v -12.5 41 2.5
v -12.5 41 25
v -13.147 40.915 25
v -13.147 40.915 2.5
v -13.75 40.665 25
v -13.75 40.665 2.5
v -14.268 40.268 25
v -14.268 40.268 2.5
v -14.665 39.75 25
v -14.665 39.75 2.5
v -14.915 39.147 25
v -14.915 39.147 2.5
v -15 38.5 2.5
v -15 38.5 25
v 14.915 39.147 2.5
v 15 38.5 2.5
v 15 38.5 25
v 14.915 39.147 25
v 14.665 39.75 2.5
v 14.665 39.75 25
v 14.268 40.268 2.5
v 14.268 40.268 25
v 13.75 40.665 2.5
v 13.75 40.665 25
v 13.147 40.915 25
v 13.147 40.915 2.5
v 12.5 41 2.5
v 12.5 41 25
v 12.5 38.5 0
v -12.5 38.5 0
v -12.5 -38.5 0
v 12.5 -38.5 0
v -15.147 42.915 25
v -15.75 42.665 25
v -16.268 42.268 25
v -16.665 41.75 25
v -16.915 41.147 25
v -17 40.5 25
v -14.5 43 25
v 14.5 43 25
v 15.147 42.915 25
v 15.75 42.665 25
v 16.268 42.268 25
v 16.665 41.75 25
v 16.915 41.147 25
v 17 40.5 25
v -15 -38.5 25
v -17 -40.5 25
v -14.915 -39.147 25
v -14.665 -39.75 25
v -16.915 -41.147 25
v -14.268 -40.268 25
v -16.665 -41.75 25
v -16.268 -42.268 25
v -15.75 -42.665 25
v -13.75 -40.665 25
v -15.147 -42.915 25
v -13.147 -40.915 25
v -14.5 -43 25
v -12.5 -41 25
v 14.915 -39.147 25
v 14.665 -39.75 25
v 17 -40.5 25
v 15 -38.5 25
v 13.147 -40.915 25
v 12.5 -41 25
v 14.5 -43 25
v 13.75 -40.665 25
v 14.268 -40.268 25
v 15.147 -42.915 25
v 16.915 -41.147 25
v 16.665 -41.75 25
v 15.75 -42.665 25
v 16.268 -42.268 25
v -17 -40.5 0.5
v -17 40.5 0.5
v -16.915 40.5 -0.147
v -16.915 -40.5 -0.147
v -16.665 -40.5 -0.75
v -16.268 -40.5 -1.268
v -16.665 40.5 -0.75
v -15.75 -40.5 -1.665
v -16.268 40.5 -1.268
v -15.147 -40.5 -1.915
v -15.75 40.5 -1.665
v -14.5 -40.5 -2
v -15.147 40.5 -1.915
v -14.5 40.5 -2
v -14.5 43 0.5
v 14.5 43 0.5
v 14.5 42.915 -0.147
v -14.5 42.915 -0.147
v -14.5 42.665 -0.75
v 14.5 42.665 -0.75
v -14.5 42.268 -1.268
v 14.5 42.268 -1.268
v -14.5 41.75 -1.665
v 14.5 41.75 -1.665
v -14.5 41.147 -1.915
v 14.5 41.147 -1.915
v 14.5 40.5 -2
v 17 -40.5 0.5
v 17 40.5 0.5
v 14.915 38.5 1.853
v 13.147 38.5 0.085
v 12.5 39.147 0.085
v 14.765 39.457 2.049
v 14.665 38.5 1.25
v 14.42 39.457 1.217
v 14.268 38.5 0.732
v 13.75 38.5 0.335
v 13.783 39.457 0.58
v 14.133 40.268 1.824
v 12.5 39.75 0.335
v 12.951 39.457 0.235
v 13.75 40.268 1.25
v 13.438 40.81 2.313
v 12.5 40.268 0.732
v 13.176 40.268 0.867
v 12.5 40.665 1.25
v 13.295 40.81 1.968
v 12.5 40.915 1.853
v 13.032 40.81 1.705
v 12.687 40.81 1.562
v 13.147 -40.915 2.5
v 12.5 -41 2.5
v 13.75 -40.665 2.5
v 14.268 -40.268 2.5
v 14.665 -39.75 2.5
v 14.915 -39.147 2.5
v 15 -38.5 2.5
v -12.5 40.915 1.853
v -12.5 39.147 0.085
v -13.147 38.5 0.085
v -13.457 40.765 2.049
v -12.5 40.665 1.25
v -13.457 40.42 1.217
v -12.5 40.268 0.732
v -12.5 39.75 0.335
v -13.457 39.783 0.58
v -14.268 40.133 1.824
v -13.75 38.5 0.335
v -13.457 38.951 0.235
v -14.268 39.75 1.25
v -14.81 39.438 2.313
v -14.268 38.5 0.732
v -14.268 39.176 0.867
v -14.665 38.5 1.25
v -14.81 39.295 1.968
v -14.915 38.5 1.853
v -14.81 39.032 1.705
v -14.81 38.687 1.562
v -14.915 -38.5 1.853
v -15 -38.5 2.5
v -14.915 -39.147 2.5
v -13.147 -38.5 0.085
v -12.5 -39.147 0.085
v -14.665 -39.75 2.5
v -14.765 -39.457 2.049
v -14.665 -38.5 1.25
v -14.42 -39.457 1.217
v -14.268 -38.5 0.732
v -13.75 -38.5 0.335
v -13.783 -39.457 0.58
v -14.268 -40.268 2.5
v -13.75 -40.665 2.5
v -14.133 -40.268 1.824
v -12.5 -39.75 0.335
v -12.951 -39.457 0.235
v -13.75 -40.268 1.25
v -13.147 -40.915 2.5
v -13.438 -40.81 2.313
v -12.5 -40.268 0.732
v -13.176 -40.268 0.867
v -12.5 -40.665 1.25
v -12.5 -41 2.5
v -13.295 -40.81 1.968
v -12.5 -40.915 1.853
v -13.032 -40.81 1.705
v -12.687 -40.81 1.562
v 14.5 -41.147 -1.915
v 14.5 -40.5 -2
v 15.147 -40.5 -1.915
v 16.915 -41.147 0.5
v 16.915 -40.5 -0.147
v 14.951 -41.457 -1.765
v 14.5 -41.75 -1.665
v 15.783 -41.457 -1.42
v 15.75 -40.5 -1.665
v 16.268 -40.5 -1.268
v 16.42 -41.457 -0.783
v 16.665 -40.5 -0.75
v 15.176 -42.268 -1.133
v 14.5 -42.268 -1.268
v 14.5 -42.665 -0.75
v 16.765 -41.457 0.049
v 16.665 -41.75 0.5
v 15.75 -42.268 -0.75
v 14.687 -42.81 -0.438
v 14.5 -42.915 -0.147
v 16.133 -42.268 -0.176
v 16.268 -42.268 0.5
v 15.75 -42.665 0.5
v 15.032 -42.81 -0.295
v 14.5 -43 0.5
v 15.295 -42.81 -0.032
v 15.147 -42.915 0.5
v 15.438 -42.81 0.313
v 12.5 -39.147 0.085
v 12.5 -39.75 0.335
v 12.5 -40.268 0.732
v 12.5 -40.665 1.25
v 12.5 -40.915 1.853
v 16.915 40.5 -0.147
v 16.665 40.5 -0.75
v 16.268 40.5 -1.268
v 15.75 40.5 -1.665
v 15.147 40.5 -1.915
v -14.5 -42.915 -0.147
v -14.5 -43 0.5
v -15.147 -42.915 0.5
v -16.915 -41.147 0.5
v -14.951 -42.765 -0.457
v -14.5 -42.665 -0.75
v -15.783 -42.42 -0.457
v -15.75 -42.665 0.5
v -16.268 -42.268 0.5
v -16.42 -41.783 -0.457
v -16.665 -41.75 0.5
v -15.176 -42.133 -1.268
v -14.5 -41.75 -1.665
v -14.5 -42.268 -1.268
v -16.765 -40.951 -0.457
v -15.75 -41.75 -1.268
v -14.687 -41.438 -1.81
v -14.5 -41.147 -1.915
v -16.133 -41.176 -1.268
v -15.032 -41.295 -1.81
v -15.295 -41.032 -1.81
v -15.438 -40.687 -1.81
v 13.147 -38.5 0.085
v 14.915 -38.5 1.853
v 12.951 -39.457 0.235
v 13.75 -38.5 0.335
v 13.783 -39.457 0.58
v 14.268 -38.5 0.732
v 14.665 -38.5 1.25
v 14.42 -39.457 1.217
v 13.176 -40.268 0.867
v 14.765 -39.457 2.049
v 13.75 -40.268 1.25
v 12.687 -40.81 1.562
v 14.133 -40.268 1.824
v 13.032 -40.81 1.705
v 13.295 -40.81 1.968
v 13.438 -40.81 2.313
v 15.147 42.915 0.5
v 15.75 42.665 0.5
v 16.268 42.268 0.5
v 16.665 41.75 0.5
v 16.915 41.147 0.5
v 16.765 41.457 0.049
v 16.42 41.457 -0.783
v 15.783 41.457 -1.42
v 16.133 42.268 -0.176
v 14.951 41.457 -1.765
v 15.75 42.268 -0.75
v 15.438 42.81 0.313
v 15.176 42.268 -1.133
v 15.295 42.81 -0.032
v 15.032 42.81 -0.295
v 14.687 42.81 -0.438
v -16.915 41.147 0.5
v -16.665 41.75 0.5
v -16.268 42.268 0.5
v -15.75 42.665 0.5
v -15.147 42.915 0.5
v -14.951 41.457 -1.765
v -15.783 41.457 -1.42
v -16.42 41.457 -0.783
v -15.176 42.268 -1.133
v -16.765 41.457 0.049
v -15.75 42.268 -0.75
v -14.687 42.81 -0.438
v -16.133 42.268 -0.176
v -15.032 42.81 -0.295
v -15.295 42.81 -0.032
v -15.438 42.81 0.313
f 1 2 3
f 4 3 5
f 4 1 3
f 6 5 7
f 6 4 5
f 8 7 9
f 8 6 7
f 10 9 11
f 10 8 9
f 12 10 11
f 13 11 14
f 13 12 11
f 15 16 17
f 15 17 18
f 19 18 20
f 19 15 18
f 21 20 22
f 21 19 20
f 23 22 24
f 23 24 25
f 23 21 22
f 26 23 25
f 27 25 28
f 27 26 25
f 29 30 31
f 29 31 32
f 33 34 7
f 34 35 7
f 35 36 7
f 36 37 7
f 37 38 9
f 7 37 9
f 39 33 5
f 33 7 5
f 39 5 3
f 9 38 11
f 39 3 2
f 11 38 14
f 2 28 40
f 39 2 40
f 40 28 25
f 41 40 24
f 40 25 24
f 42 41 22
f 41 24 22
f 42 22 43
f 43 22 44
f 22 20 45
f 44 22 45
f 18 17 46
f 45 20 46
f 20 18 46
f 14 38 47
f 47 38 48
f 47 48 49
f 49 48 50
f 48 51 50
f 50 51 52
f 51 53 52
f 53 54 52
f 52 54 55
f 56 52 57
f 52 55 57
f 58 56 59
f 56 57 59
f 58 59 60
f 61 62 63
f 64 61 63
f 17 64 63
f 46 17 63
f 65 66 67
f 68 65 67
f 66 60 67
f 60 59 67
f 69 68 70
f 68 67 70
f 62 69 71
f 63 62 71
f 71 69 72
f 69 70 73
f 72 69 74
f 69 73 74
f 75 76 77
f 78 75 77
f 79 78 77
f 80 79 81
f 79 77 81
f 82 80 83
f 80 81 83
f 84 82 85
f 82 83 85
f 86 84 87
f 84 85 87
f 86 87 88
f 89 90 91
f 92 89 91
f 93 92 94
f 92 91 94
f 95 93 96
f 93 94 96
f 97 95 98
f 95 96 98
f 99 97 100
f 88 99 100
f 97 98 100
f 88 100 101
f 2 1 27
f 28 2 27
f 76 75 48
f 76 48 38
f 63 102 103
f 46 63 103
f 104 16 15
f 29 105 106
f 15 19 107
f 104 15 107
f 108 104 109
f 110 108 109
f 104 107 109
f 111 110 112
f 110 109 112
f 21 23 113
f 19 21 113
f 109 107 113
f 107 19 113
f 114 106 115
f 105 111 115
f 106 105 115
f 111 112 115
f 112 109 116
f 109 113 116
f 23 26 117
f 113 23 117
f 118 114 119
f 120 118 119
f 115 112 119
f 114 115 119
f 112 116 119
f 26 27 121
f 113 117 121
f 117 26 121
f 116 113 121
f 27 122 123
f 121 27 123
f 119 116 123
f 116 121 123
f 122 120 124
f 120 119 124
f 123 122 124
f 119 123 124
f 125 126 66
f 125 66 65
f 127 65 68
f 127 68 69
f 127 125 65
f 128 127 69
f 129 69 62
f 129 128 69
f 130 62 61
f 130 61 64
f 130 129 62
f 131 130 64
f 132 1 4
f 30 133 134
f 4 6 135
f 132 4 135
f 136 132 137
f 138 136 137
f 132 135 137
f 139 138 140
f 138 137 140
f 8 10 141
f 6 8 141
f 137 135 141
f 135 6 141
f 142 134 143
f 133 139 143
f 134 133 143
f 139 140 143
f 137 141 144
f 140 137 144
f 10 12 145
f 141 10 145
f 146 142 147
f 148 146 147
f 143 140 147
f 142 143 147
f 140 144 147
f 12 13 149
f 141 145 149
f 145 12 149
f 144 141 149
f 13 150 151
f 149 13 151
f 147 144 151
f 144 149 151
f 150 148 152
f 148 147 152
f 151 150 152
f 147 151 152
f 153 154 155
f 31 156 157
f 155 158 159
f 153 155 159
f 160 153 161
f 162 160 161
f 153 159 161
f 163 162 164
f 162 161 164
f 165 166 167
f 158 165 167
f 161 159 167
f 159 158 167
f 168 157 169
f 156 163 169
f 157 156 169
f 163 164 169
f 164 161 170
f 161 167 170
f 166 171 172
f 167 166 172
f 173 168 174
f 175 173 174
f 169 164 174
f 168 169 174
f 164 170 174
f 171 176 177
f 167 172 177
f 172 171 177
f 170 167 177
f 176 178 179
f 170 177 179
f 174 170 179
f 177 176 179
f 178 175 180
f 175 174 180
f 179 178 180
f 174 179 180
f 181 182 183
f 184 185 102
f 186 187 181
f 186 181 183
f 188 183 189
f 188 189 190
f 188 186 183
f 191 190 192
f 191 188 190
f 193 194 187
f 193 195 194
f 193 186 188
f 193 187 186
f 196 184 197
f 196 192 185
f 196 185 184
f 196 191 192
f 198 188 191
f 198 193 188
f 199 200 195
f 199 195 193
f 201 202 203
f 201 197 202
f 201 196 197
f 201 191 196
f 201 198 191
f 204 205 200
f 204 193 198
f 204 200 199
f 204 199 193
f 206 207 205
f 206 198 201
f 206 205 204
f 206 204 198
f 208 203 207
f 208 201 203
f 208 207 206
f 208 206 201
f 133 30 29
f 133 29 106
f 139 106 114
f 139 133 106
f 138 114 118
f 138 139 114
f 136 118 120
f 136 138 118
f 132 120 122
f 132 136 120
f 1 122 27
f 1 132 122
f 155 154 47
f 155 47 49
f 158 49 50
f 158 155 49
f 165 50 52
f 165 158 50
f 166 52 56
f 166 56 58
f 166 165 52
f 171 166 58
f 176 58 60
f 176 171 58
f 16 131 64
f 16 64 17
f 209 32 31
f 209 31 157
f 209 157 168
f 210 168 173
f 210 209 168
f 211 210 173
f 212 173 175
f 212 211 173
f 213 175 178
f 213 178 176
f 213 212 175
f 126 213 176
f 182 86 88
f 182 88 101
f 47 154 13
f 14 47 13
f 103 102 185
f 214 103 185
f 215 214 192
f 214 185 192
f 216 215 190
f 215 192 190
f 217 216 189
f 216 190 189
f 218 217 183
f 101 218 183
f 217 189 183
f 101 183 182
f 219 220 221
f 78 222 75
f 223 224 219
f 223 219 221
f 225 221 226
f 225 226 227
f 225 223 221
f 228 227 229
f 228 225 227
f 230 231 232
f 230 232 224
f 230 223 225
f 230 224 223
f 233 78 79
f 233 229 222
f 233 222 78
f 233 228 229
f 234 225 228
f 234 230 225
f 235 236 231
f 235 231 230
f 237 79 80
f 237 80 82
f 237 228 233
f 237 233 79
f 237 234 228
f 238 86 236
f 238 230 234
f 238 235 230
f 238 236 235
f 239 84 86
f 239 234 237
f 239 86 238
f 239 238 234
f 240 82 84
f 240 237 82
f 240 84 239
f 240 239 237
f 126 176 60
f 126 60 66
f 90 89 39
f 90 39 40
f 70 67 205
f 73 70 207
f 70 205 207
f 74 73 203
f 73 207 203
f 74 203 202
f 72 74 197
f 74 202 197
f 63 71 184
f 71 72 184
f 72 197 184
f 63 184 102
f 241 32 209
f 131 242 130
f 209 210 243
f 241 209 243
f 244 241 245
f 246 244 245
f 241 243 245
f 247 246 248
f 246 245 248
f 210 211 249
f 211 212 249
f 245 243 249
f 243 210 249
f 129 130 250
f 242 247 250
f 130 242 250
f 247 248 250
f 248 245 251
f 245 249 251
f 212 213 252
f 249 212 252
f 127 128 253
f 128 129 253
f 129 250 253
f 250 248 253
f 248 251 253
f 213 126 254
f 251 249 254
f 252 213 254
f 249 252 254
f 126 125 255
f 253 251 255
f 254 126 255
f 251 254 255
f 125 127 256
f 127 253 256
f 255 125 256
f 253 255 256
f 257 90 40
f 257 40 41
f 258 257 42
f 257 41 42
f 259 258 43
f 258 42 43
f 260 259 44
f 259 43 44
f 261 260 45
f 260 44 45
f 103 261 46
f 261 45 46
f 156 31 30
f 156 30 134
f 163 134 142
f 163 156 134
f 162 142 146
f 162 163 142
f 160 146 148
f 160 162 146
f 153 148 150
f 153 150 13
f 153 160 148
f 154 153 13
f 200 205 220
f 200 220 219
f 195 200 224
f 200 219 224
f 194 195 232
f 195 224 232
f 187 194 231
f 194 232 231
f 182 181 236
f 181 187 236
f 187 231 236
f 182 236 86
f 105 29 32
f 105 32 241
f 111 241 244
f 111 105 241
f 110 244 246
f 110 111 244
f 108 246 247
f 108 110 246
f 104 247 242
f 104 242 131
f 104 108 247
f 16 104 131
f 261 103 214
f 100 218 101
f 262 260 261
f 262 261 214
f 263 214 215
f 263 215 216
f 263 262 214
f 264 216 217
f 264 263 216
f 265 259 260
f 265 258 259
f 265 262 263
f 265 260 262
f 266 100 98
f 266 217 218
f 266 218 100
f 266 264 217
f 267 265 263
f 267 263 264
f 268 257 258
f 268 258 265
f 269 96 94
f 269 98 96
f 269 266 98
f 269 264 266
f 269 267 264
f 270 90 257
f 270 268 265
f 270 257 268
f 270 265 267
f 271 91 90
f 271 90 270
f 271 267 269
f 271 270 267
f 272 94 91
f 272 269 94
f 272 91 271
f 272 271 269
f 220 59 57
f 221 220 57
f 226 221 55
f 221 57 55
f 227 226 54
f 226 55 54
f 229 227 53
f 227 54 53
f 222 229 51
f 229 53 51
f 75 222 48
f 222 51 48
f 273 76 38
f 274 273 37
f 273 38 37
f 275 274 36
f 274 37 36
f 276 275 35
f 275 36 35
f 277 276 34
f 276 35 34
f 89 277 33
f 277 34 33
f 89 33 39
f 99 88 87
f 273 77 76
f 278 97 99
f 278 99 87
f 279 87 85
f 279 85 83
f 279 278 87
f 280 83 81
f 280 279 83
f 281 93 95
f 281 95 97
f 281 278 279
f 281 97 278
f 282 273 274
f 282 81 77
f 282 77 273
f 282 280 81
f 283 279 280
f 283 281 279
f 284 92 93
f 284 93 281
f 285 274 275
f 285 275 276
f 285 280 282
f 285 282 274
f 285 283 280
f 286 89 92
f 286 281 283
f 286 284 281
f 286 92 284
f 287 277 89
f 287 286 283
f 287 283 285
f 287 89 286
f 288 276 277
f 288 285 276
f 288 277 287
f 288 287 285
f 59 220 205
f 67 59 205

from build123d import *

# Parameters (mm, degrees)
ESQUISSE1_W        = 30
ESQUISSE1_H        = 82
BOSS_EXTRU_1_DEPTH = 25
COQUE1_T           = 2
CONG_1_R           = 2.5


with BuildPart() as part:
    # Esquisse1 → Boss.-Extru.1 (new body)
    with BuildSketch(Plane.XY):
        Rectangle(ESQUISSE1_W, ESQUISSE1_H)
    extrude(amount=BOSS_EXTRU_1_DEPTH)

    # Coque1
    coque1_openings = [part.faces().sort_by_distance(p)[0] for p in [
        (0, 0, 25),
    ]]
    offset(amount=COQUE1_T, openings=coque1_openings, kind=Kind.INTERSECTION)

    # Congé1
    # the kernel refuses this fillet: 2.5 mm, written as the material it adds along each edge
    with BuildSketch(Plane(origin=(-12.5, -38.5, 2.5), x_dir=(-1, 0, 0), z_dir=(0, -1, 0))) as cong_1_piece_1_section:
        Polygon((0, 0), (CONG_1_R, 0), (CONG_1_R, CONG_1_R), (0, CONG_1_R), align=None)
    cong_1_piece_1 = extrude(amount=CONG_1_R, mode=Mode.PRIVATE)
    cong_1_piece_1 = cong_1_piece_1 - Plane(origin=(-12.5, -38.5, 2.5), x_dir=(0.7071067811865475, 0, 0.7071067811865475), z_dir=(0, -1, 0)) * Sphere(CONG_1_R, mode=Mode.PRIVATE)
    add(cong_1_piece_1)
    with BuildSketch(Plane(origin=(-12.5, 38.5, 2.5), x_dir=(0, 1, 0), z_dir=(-1, 0, 0))) as cong_1_piece_2_section:
        Polygon((0, 0), (CONG_1_R, 0), (CONG_1_R, CONG_1_R), (0, CONG_1_R), align=None)
    cong_1_piece_2 = extrude(amount=CONG_1_R, mode=Mode.PRIVATE)
    cong_1_piece_2 = cong_1_piece_2 - Plane(origin=(-12.5, 38.5, 2.5), x_dir=(0, -0.7071067811865475, 0.7071067811865475), z_dir=(-1, 0, 0)) * Sphere(CONG_1_R, mode=Mode.PRIVATE)
    add(cong_1_piece_2)
    with BuildSketch(Plane(origin=(12.5, -38.5, 2.5), x_dir=(1, 0, 0), z_dir=(0, -1, 0))) as cong_1_piece_3_section:
        Polygon((0, 0), (CONG_1_R, 0), (CONG_1_R, -CONG_1_R), (0, -CONG_1_R), align=None)
    cong_1_piece_3 = extrude(amount=CONG_1_R, mode=Mode.PRIVATE)
    cong_1_piece_3 = cong_1_piece_3 - Plane(origin=(12.5, -38.5, 2.5), x_dir=(-0.7071067811865475, 0, 0.7071067811865475), z_dir=(0, -1, 0)) * Sphere(CONG_1_R, mode=Mode.PRIVATE)
    add(cong_1_piece_3)
    with BuildSketch(Plane(origin=(12.5, 38.5, 2.5), x_dir=(1, 0, 0), z_dir=(0, 1, 0))) as cong_1_piece_4_section:
        Polygon((0, 0), (CONG_1_R, 0), (CONG_1_R, CONG_1_R), (0, CONG_1_R), align=None)
    cong_1_piece_4 = extrude(amount=CONG_1_R, mode=Mode.PRIVATE)
    cong_1_piece_4 = cong_1_piece_4 - Plane(origin=(12.5, 38.5, 2.5), x_dir=(-0.7071067811865475, 0, 0.7071067811865475), z_dir=(0, 1, 0)) * Sphere(CONG_1_R, mode=Mode.PRIVATE)
    add(cong_1_piece_4)
    with BuildSketch(Plane(origin=(-15, -38.5, 0), x_dir=(0, 0, 1), z_dir=(0, 1, 0)), Plane(origin=(15, 38.5, 0), x_dir=(0, 0, 1), z_dir=(0, -1, 0))) as cong_1_piece_5:
        with BuildLine():
            CenterArc((CONG_1_R, CONG_1_R), CONG_1_R, 180, 90)
            Line((0, CONG_1_R), (0, 0))
            Line((0, 0), (CONG_1_R, 0))
        make_face()
    extrude(amount=77)
    with BuildSketch(Plane(origin=(-15, 41, 2.5), x_dir=(0, -1, 0), z_dir=(0, 0, 1)), Plane(origin=(-15, -41, 2.5), x_dir=(1, 0, 0), z_dir=(0, 0, 1)), Plane(origin=(15, 41, 2.5), x_dir=(-1, 0, 0), z_dir=(0, 0, 1))) as cong_1_piece_6:
        with BuildLine():
            CenterArc((CONG_1_R, CONG_1_R), CONG_1_R, 180, 90)
            Line((0, CONG_1_R), (0, 0))
            Line((0, 0), (CONG_1_R, 0))
        make_face()
    extrude(amount=22.5)
    with BuildSketch(Plane(origin=(12.5, -41, 0), x_dir=(0, 0, 1), z_dir=(-1, 0, 0)), Plane(origin=(-12.5, 41, 0), x_dir=(0, 0, 1), z_dir=(1, 0, 0))) as cong_1_piece_7:
        with BuildLine():
            CenterArc((CONG_1_R, CONG_1_R), CONG_1_R, 180, 90)
            Line((0, CONG_1_R), (0, 0))
            Line((0, 0), (CONG_1_R, 0))
        make_face()
    extrude(amount=25)
    with BuildSketch(Plane(origin=(15, -41, 2.5), x_dir=(-1, 0, 0), z_dir=(0, 0, 1))) as cong_1_piece_8:
        with BuildLine():
            CenterArc((CONG_1_R, -CONG_1_R), CONG_1_R, 90, 90)
            Line((0, -CONG_1_R), (0, 0))
            Line((0, 0), (CONG_1_R, 0))
        make_face()
    extrude(amount=22.5)
    # the kernel refuses this fillet: 2.5 mm, written as the material it takes off along each edge
    with BuildSketch(Plane(origin=(14.5, 40.5, 0.5), x_dir=(0, 0, -1), z_dir=(0, 1, 0))) as cong_1_2_piece_1_section:
        Polygon((0, 0), (CONG_1_R, 0), (CONG_1_R, -CONG_1_R), (0, -CONG_1_R), align=None)
    cong_1_2_piece_1 = extrude(amount=CONG_1_R, mode=Mode.PRIVATE)
    cong_1_2_piece_1 = cong_1_2_piece_1 - Plane(origin=(14.5, 40.5, 0.5), x_dir=(-0.7071067811865475, 0, 0.7071067811865475), z_dir=(0, 1, 0)) * Sphere(CONG_1_R, mode=Mode.PRIVATE)
    add(cong_1_2_piece_1, mode=Mode.SUBTRACT)
    with BuildSketch(Plane(origin=(-14.5, 40.5, 0.5), x_dir=(0, 0, -1), z_dir=(0, 1, 0))) as cong_1_2_piece_2_section:
        Polygon((0, 0), (CONG_1_R, 0), (CONG_1_R, CONG_1_R), (0, CONG_1_R), align=None)
    cong_1_2_piece_2 = extrude(amount=CONG_1_R, mode=Mode.PRIVATE)
    cong_1_2_piece_2 = cong_1_2_piece_2 - Plane(origin=(-14.5, 40.5, 0.5), x_dir=(0.7071067811865475, 0, 0.7071067811865475), z_dir=(0, 1, 0)) * Sphere(CONG_1_R, mode=Mode.PRIVATE)
    add(cong_1_2_piece_2, mode=Mode.SUBTRACT)
    with BuildSketch(Plane(origin=(14.5, -40.5, 0.5), x_dir=(1, 0, 0), z_dir=(0, -1, 0))) as cong_1_2_piece_3_section:
        Polygon((0, 0), (CONG_1_R, 0), (CONG_1_R, -CONG_1_R), (0, -CONG_1_R), align=None)
    cong_1_2_piece_3 = extrude(amount=CONG_1_R, mode=Mode.PRIVATE)
    cong_1_2_piece_3 = cong_1_2_piece_3 - Plane(origin=(14.5, -40.5, 0.5), x_dir=(-0.7071067811865475, 0, 0.7071067811865475), z_dir=(0, -1, 0)) * Sphere(CONG_1_R, mode=Mode.PRIVATE)
    add(cong_1_2_piece_3, mode=Mode.SUBTRACT)
    with BuildSketch(Plane(origin=(-14.5, -40.5, 0.5), x_dir=(0, -1, 0), z_dir=(0, 0, -1))) as cong_1_2_piece_4_section:
        Polygon((0, 0), (CONG_1_R, 0), (CONG_1_R, CONG_1_R), (0, CONG_1_R), align=None)
    cong_1_2_piece_4 = extrude(amount=CONG_1_R, mode=Mode.PRIVATE)
    cong_1_2_piece_4 = cong_1_2_piece_4 - Plane(origin=(-14.5, -40.5, 0.5), x_dir=(0.7071067811865475, 0.7071067811865476, 0), z_dir=(0, 0, -1)) * Sphere(CONG_1_R, mode=Mode.PRIVATE)
    add(cong_1_2_piece_4, mode=Mode.SUBTRACT)
    with BuildSketch(Plane(origin=(14.5, 43, -2), x_dir=(0, 0, 1), z_dir=(-1, 0, 0)), Plane(origin=(-14.5, -43, -2), x_dir=(0, 0, 1), z_dir=(1, 0, 0))) as cong_1_2_piece_5:
        with BuildLine():
            CenterArc((CONG_1_R, -CONG_1_R), CONG_1_R, 90, 90)
            Line((0, -CONG_1_R), (0, 0))
            Line((0, 0), (CONG_1_R, 0))
        make_face()
    extrude(amount=29, mode=Mode.SUBTRACT)
    with BuildSketch(Plane(origin=(17, -40.5, -2), x_dir=(0, 0, 1), z_dir=(0, 1, 0)), Plane(origin=(-17, 40.5, -2), x_dir=(0, 0, 1), z_dir=(0, -1, 0))) as cong_1_2_piece_6:
        with BuildLine():
            CenterArc((CONG_1_R, -CONG_1_R), CONG_1_R, 90, 90)
            Line((0, -CONG_1_R), (0, 0))
            Line((0, 0), (CONG_1_R, 0))
        make_face()
    extrude(amount=81, mode=Mode.SUBTRACT)
    with BuildSketch(Plane(origin=(-17, 43, 31.25), x_dir=(1, 0, 0), z_dir=(0, 0, -1)), Plane(origin=(17, -43, 0.5), x_dir=(0, 1, 0), z_dir=(0, 0, 1))) as cong_1_2_piece_7:
        with BuildLine():
            CenterArc((CONG_1_R, CONG_1_R), CONG_1_R, 180, 90)
            Line((0, CONG_1_R), (0, 0))
            Line((0, 0), (CONG_1_R, 0))
        make_face()
    extrude(amount=30.75, mode=Mode.SUBTRACT)
    with BuildSketch(Plane(origin=(17, 43, 31.25), x_dir=(-1, 0, 0), z_dir=(0, 0, -1)), Plane(origin=(-17, -43, 31.25), x_dir=(1, 0, 0), z_dir=(0, 0, -1))) as cong_1_2_piece_8:
        with BuildLine():
            CenterArc((CONG_1_R, -CONG_1_R), CONG_1_R, 90, 90)
            Line((0, -CONG_1_R), (0, 0))
            Line((0, 0), (CONG_1_R, 0))
        make_face()
    extrude(amount=30.75, mode=Mode.SUBTRACT)


solid = part.part
